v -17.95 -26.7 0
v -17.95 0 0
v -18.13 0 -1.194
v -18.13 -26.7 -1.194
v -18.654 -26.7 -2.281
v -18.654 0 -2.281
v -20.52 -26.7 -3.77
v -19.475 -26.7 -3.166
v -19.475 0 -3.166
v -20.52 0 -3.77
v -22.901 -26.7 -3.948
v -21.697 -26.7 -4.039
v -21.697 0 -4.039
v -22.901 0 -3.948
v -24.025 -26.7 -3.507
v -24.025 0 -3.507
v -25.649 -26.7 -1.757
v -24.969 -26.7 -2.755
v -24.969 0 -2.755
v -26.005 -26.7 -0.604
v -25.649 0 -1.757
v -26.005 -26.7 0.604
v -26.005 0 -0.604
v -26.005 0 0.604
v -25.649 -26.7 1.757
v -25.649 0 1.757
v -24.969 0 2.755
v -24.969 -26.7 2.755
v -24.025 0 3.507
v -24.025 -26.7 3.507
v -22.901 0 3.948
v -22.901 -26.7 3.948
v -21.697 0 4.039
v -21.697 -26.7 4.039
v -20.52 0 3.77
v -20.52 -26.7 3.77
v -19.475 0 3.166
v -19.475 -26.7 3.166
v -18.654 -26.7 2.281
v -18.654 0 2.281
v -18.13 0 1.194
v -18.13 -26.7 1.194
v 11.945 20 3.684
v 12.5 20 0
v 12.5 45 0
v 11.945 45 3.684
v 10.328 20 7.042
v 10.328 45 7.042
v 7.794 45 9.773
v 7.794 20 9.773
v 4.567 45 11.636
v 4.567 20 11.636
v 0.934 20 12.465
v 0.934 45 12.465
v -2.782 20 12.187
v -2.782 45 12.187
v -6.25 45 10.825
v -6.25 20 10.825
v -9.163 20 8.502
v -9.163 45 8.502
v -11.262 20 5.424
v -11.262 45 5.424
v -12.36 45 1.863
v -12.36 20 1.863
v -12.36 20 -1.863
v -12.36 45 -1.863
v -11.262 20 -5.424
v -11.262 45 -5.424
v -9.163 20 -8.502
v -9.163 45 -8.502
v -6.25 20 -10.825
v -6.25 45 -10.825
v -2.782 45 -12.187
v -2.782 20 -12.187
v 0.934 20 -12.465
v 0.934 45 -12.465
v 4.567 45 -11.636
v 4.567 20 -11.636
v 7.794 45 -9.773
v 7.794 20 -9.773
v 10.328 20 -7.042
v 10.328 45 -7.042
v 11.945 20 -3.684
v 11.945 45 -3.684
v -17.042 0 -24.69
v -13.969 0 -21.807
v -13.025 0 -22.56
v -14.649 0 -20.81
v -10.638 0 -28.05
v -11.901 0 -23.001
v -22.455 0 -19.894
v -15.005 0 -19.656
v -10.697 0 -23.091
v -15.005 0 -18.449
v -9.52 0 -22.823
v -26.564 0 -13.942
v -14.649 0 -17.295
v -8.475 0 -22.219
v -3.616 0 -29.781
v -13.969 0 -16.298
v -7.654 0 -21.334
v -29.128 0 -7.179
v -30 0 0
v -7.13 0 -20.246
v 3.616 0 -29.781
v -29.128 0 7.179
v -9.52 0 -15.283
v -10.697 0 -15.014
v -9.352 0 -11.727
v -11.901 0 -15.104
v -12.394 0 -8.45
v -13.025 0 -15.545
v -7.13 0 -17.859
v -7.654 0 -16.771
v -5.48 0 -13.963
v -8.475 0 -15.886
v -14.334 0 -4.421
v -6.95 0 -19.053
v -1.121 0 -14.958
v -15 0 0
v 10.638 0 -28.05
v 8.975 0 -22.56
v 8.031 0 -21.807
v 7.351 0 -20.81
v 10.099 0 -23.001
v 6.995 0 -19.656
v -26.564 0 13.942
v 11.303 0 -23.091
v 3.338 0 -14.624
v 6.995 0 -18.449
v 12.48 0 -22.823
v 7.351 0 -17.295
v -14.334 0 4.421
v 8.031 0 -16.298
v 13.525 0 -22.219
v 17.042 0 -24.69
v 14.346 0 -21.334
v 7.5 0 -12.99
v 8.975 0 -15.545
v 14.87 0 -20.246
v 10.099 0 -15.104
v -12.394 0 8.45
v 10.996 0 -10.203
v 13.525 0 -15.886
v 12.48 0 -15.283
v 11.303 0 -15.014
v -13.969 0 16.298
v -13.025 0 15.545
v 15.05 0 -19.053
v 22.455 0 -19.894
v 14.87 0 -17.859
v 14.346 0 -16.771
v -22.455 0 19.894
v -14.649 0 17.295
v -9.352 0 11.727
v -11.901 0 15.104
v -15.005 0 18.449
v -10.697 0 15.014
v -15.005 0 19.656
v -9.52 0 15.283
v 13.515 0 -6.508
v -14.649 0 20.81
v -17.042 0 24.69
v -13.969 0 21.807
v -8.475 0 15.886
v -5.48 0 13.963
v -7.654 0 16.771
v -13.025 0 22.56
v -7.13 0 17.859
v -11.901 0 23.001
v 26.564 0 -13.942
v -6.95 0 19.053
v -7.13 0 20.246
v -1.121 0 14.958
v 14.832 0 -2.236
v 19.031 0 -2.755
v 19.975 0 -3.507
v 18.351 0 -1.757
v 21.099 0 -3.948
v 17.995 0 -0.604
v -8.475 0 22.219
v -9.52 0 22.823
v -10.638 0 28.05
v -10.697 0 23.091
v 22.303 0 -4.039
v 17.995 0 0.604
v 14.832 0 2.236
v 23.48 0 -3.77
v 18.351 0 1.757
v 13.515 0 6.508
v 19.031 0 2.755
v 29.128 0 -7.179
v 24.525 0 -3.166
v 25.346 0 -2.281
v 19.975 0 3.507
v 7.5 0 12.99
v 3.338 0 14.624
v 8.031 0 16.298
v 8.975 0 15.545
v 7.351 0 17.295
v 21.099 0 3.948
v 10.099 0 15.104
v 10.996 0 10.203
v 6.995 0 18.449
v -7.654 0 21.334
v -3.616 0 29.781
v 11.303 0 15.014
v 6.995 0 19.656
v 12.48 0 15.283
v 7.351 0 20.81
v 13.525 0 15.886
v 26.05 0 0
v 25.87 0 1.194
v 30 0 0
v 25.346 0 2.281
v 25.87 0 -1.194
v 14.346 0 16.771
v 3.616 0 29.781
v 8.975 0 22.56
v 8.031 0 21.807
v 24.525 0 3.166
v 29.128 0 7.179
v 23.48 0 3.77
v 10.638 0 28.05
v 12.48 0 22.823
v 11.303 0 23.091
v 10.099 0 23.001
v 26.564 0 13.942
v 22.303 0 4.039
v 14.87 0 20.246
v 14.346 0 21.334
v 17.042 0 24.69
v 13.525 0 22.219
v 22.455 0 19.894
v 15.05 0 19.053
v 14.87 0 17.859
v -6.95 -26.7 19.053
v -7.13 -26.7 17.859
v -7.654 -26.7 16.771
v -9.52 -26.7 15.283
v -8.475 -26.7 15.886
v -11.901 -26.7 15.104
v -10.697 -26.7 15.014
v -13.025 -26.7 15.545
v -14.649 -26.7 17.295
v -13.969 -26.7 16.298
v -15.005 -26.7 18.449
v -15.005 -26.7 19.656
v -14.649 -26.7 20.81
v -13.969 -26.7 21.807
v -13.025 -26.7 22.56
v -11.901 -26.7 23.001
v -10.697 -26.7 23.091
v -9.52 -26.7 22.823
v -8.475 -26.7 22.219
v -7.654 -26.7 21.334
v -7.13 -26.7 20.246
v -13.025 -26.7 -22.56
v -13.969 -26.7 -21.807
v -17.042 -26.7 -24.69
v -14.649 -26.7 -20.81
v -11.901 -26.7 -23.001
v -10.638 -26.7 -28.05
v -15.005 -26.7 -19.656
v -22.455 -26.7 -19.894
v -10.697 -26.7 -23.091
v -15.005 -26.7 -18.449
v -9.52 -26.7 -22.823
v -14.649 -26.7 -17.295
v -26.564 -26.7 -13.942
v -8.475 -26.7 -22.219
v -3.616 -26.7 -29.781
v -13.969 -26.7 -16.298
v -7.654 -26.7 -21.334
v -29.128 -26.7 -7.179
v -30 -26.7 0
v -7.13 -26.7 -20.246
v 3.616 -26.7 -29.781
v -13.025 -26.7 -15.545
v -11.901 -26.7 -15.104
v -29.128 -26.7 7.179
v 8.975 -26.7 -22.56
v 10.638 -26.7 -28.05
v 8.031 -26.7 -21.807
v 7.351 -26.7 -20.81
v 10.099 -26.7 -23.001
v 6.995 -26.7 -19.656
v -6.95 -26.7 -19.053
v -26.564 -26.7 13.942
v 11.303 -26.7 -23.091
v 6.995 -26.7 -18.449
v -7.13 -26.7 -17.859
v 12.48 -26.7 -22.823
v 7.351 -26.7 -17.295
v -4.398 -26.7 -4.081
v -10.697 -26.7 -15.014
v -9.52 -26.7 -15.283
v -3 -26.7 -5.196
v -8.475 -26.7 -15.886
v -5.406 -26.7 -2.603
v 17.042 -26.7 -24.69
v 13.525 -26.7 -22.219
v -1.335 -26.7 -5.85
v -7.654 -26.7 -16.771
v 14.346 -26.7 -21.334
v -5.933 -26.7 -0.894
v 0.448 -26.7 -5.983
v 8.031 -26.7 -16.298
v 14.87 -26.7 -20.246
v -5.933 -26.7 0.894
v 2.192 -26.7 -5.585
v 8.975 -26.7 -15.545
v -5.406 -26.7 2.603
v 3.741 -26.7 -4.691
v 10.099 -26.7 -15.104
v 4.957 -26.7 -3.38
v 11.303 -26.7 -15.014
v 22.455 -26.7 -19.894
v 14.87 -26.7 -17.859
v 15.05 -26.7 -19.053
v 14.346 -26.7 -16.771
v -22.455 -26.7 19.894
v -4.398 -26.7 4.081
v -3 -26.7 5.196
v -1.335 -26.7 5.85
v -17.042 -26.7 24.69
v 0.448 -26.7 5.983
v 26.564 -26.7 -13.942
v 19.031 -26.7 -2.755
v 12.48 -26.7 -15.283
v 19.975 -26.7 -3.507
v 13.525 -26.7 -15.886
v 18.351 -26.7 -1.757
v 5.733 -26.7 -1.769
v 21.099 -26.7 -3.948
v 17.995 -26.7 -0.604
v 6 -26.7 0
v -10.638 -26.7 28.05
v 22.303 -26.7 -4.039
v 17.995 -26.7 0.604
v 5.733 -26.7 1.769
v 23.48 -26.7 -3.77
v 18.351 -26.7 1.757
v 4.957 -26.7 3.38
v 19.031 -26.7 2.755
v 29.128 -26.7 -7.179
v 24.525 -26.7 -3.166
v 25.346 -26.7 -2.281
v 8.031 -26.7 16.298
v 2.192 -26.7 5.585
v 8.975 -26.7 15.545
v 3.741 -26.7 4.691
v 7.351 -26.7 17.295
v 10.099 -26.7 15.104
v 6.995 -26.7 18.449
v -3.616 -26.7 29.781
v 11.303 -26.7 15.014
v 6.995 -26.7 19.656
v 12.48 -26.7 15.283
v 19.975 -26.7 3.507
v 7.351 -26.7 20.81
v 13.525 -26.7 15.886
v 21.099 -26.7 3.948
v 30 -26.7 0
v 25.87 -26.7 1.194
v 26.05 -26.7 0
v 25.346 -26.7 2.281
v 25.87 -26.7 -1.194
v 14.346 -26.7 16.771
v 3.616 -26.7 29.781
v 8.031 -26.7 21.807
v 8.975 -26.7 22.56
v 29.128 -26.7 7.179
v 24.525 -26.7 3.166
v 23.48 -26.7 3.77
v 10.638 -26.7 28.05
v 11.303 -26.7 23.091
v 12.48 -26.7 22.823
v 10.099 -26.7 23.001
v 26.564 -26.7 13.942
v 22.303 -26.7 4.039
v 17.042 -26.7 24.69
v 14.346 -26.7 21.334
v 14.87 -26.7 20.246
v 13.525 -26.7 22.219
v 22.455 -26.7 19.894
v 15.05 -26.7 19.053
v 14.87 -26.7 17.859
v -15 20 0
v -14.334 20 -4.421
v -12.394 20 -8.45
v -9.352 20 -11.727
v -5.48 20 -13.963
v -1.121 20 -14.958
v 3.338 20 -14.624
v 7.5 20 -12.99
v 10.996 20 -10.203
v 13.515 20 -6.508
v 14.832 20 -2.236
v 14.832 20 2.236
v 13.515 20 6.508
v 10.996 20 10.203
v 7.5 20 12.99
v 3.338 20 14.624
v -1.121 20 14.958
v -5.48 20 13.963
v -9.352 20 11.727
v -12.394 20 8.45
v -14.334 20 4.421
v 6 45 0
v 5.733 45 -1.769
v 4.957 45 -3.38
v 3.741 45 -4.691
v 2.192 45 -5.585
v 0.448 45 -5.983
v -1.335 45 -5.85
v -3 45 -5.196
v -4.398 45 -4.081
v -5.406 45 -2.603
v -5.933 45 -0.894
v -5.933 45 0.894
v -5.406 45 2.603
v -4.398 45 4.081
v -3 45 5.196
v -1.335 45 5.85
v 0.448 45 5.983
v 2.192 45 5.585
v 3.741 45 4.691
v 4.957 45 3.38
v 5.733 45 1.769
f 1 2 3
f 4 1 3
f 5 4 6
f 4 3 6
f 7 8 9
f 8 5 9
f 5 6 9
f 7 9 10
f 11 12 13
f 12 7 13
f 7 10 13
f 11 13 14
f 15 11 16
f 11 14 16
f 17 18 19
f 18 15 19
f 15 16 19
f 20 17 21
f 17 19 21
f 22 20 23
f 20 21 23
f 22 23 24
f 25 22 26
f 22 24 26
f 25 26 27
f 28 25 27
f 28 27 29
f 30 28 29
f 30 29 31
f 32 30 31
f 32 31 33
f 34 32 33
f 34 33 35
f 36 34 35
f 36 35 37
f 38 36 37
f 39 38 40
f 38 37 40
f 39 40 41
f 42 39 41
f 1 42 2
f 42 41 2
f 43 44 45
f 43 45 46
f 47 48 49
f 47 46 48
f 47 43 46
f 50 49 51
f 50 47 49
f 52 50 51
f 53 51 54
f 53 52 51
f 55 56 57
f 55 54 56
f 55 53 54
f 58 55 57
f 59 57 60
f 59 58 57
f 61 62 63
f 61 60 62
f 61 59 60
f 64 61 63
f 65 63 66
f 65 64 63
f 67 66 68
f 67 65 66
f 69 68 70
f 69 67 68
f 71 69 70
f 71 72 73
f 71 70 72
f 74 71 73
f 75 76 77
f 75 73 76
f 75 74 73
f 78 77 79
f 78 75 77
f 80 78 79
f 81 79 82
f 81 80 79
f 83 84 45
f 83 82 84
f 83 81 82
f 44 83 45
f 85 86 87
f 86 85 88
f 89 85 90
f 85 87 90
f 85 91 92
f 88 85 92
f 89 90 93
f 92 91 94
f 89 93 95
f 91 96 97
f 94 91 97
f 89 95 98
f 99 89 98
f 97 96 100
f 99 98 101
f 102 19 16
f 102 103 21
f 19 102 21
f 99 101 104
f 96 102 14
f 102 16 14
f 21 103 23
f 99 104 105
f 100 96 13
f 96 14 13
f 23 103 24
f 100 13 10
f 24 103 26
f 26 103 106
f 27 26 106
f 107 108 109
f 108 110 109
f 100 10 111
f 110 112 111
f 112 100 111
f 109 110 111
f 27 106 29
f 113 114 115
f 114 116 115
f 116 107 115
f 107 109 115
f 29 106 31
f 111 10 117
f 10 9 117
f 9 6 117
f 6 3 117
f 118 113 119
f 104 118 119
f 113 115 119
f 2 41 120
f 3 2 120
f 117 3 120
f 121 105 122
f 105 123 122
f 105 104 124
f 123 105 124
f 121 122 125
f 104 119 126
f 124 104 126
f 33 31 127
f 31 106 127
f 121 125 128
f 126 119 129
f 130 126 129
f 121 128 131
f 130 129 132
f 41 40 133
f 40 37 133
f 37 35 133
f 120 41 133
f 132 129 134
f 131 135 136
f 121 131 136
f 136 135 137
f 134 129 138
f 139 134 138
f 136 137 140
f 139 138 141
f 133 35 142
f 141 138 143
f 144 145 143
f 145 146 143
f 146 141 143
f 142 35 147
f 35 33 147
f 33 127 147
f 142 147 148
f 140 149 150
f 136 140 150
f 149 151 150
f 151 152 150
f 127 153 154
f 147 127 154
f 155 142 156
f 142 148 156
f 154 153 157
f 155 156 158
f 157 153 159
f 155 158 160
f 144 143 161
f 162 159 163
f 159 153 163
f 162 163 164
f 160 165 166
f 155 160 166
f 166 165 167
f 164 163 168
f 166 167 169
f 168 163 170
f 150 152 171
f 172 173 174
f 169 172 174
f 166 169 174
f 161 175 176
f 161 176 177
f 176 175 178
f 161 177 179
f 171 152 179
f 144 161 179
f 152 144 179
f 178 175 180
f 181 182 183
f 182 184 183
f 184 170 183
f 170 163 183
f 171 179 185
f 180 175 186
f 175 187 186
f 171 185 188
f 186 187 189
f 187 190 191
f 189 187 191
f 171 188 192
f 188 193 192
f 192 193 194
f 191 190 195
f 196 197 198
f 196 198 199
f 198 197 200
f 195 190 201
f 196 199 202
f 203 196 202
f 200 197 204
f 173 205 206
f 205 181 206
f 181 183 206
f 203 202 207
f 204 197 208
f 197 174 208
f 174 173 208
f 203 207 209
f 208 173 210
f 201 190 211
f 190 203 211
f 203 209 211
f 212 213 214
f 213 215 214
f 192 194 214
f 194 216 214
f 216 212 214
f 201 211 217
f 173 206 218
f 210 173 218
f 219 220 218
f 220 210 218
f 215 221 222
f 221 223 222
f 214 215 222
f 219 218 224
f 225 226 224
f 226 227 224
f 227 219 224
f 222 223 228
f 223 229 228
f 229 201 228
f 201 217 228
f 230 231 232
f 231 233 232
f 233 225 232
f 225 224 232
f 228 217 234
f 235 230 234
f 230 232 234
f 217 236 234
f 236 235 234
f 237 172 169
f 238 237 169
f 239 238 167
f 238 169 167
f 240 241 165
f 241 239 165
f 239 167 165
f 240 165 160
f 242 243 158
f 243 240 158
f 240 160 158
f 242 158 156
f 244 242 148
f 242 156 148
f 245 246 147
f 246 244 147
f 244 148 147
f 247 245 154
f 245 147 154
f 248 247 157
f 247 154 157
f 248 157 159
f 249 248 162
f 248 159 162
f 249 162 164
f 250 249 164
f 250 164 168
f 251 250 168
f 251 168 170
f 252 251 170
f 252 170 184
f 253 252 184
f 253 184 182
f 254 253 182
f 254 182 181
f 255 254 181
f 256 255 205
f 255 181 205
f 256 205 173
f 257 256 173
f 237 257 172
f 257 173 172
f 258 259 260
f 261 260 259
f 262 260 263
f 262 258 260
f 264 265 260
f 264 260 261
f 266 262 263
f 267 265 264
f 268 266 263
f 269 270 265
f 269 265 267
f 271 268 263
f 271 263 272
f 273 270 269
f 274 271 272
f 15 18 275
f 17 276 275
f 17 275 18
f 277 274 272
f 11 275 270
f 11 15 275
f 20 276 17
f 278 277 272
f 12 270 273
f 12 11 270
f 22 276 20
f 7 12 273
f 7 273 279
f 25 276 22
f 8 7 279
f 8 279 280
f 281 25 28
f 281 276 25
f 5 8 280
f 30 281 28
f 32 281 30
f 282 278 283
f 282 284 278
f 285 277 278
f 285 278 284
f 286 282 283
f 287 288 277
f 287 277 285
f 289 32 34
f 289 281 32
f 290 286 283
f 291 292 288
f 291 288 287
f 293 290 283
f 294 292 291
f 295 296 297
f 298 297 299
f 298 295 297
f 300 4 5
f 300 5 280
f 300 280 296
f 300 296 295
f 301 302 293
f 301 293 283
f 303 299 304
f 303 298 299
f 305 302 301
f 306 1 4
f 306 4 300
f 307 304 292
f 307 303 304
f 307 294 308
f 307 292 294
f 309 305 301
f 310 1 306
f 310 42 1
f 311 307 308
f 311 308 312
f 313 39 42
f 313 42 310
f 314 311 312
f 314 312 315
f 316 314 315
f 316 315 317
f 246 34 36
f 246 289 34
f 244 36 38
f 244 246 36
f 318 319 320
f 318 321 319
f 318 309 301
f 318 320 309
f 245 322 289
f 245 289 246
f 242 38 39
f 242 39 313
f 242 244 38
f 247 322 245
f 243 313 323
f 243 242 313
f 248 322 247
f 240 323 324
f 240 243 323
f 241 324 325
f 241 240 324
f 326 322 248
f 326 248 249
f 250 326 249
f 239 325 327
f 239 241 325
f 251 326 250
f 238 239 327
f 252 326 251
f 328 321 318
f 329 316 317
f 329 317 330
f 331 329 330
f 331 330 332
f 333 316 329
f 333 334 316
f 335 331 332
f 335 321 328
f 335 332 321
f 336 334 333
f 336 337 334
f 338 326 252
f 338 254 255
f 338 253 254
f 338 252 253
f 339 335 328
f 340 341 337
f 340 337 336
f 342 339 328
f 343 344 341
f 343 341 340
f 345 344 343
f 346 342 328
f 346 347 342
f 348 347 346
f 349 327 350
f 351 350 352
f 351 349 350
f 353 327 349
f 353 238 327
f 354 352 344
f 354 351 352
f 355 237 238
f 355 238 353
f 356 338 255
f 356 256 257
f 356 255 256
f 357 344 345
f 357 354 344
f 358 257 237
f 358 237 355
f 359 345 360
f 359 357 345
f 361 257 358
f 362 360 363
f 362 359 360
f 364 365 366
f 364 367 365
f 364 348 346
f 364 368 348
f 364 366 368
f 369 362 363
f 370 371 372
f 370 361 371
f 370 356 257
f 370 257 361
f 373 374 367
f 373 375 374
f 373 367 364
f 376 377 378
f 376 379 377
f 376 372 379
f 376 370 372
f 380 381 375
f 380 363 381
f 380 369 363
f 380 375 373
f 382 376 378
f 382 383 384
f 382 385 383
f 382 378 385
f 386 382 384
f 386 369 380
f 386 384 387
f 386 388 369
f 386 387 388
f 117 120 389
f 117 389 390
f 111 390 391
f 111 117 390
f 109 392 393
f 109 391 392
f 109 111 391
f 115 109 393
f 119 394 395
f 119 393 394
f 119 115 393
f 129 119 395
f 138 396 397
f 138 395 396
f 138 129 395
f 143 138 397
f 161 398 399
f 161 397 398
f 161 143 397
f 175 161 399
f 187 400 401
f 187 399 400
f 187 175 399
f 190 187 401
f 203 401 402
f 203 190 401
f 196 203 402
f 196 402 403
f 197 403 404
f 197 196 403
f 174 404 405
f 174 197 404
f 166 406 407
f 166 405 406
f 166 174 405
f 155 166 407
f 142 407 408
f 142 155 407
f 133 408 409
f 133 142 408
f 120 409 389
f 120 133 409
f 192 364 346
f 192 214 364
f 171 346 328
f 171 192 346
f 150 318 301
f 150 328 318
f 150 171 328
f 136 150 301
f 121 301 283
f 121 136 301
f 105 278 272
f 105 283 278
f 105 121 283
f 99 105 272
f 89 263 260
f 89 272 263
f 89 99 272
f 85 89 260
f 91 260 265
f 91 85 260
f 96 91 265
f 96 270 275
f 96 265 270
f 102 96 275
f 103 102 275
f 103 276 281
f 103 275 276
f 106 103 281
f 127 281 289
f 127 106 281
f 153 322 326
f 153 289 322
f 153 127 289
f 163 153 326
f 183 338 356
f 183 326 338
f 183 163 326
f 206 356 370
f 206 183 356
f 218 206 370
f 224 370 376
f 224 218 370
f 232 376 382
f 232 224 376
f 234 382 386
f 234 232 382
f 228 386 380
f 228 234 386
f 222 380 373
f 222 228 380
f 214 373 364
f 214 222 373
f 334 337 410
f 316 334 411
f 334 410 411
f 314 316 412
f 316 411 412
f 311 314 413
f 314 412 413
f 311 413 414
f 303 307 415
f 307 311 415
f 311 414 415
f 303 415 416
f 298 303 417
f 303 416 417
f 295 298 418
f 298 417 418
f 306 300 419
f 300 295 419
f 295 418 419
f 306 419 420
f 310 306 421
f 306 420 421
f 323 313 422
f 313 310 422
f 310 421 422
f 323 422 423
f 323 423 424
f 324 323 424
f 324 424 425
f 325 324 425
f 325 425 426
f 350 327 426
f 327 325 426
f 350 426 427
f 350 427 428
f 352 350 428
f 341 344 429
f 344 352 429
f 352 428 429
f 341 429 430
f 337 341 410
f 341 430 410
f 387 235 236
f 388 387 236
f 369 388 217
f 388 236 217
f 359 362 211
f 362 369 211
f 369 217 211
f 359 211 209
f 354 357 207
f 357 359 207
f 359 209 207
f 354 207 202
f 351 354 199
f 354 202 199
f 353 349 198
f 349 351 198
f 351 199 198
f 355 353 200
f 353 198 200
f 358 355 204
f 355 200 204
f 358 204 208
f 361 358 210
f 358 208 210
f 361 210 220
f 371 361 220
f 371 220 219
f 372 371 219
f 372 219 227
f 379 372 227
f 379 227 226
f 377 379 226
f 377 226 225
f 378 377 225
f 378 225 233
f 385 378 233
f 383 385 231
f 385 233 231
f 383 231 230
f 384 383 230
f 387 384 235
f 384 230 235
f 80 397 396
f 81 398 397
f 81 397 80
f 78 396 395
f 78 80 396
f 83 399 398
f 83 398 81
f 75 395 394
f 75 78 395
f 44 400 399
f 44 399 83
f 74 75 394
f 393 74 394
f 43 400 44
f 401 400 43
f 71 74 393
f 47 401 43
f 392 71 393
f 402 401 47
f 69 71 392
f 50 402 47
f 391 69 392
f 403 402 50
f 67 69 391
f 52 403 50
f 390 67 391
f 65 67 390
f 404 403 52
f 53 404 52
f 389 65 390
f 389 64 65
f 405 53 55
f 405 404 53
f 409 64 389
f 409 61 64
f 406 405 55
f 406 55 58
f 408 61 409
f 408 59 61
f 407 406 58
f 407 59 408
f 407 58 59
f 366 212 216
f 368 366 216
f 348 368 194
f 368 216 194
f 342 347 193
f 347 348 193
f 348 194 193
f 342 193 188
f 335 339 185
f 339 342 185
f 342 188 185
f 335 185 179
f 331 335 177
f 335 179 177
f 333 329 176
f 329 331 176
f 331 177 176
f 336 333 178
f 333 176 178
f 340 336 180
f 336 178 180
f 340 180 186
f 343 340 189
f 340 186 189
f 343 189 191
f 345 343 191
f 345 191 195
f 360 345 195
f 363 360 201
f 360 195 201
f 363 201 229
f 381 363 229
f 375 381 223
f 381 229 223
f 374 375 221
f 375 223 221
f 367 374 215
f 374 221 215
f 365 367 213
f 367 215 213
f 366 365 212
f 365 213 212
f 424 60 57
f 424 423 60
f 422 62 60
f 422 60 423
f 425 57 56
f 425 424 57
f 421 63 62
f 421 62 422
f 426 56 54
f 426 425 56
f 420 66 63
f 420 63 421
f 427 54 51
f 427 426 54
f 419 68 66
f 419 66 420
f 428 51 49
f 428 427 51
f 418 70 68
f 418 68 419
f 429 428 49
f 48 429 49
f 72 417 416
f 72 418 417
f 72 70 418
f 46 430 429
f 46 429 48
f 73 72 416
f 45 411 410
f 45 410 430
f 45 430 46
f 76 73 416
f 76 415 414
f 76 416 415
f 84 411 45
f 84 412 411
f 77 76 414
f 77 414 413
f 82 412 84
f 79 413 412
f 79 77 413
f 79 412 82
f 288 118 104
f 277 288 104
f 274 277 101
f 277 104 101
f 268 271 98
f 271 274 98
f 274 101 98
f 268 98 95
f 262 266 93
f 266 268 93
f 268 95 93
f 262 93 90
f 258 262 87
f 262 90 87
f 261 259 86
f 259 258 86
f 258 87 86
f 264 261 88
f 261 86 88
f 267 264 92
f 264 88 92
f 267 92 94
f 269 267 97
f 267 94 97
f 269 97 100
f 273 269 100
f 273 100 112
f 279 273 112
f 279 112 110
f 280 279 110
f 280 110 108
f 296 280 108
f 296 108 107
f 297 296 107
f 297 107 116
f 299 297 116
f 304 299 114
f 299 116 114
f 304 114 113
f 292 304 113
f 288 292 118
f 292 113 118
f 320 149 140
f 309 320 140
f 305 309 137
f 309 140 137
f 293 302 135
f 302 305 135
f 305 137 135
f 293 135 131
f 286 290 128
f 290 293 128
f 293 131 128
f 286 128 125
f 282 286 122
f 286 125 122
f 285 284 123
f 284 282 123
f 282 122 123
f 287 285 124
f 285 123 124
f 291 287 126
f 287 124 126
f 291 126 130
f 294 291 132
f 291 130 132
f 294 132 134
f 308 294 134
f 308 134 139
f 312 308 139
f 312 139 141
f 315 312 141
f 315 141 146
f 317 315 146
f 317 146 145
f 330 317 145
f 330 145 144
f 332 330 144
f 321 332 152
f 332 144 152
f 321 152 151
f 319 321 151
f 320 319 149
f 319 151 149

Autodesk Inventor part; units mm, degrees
ref_plane "YZ Plane" through (0, 0, 0) normal (1, 0, 0) x (0, 1, 0)
ref_plane "XZ Plane" through (0, 0, 0) normal (0, 1, 0) x (-1, 0, 0)
ref_plane "XY Plane" through (0, 0, 0) normal (0, 0, 1) x (1, 0, 0)
sketch "Sketch1" plane through (0, 0, 0) normal (0, 1, 0) x (-1, 0, 0)
  circle A0 centre (0, 0) radius 15
  dimension "d0" = 30
extrude "Extrusion1" add sketch "Sketch1" along normal blind 20
sketch "Sketch2" plane through (0, 20, 0) normal (0, 1, 0) x (1, 0, 0)
  circle A0 centre (0, 0) radius 12.5
  dimension "d3" = 25
extrude "Extrusion2" add sketch "Sketch2" along normal blind 25
sketch "Sketch3" plane through (0, 45, 0) normal (0, 1, 0) x (1, 0, 0)
  circle A0 centre (0, 0) radius 6
extrude "Extrusion3" cut sketch "Sketch3" against normal blind 100
sketch "Sketch4" plane through (0, 0, 0) normal (0, -1, 0) x (1, 0, 0)
  circle A0 centre (0, 0) radius 6
  circle A1 centre (0, 0) radius 30
  circle A2 centre (22, 0) radius 4.05
  circle A3 centre (11, 19.0526) radius 4.05
  circle A4 centre (-11, 19.0526) radius 4.05
  circle A5 centre (-22, 0) radius 4.05
  circle A6 centre (-11, -19.0526) radius 4.05
  circle A7 centre (11, -19.0526) radius 4.05
  dimension "d8" = 60
  dimension "d11" = 12
  dimension "d12" = 22
  dimension "d13" = 8.1
  dimension "d16" = 360
extrude "Extrusion4" add sketch "Sketch4" along normal blind 10
sketch "Sketch5" plane through (0, -10, 0) normal (0, -1, 0) x (1, 0, 0)
  circle A0 centre (0, 0) radius 30 projected
  circle A1 centre (11, -19.0526) radius 4.05 projected
  circle A2 centre (-11, -19.0526) radius 4.05 projected
  circle A3 centre (-22, 0) radius 4.05 projected
  circle A4 centre (-11, 19.0526) radius 4.05 projected
  circle A5 centre (11, 19.0526) radius 4.05 projected
  circle A6 centre (22, 0) radius 4.05 projected
  circle A7 centre (0, 0) radius 6 projected
extrude "Extrusion5" add sketch "Sketch5" along normal blind 16.7
properties part number "MiniPodsipnikNatag"
